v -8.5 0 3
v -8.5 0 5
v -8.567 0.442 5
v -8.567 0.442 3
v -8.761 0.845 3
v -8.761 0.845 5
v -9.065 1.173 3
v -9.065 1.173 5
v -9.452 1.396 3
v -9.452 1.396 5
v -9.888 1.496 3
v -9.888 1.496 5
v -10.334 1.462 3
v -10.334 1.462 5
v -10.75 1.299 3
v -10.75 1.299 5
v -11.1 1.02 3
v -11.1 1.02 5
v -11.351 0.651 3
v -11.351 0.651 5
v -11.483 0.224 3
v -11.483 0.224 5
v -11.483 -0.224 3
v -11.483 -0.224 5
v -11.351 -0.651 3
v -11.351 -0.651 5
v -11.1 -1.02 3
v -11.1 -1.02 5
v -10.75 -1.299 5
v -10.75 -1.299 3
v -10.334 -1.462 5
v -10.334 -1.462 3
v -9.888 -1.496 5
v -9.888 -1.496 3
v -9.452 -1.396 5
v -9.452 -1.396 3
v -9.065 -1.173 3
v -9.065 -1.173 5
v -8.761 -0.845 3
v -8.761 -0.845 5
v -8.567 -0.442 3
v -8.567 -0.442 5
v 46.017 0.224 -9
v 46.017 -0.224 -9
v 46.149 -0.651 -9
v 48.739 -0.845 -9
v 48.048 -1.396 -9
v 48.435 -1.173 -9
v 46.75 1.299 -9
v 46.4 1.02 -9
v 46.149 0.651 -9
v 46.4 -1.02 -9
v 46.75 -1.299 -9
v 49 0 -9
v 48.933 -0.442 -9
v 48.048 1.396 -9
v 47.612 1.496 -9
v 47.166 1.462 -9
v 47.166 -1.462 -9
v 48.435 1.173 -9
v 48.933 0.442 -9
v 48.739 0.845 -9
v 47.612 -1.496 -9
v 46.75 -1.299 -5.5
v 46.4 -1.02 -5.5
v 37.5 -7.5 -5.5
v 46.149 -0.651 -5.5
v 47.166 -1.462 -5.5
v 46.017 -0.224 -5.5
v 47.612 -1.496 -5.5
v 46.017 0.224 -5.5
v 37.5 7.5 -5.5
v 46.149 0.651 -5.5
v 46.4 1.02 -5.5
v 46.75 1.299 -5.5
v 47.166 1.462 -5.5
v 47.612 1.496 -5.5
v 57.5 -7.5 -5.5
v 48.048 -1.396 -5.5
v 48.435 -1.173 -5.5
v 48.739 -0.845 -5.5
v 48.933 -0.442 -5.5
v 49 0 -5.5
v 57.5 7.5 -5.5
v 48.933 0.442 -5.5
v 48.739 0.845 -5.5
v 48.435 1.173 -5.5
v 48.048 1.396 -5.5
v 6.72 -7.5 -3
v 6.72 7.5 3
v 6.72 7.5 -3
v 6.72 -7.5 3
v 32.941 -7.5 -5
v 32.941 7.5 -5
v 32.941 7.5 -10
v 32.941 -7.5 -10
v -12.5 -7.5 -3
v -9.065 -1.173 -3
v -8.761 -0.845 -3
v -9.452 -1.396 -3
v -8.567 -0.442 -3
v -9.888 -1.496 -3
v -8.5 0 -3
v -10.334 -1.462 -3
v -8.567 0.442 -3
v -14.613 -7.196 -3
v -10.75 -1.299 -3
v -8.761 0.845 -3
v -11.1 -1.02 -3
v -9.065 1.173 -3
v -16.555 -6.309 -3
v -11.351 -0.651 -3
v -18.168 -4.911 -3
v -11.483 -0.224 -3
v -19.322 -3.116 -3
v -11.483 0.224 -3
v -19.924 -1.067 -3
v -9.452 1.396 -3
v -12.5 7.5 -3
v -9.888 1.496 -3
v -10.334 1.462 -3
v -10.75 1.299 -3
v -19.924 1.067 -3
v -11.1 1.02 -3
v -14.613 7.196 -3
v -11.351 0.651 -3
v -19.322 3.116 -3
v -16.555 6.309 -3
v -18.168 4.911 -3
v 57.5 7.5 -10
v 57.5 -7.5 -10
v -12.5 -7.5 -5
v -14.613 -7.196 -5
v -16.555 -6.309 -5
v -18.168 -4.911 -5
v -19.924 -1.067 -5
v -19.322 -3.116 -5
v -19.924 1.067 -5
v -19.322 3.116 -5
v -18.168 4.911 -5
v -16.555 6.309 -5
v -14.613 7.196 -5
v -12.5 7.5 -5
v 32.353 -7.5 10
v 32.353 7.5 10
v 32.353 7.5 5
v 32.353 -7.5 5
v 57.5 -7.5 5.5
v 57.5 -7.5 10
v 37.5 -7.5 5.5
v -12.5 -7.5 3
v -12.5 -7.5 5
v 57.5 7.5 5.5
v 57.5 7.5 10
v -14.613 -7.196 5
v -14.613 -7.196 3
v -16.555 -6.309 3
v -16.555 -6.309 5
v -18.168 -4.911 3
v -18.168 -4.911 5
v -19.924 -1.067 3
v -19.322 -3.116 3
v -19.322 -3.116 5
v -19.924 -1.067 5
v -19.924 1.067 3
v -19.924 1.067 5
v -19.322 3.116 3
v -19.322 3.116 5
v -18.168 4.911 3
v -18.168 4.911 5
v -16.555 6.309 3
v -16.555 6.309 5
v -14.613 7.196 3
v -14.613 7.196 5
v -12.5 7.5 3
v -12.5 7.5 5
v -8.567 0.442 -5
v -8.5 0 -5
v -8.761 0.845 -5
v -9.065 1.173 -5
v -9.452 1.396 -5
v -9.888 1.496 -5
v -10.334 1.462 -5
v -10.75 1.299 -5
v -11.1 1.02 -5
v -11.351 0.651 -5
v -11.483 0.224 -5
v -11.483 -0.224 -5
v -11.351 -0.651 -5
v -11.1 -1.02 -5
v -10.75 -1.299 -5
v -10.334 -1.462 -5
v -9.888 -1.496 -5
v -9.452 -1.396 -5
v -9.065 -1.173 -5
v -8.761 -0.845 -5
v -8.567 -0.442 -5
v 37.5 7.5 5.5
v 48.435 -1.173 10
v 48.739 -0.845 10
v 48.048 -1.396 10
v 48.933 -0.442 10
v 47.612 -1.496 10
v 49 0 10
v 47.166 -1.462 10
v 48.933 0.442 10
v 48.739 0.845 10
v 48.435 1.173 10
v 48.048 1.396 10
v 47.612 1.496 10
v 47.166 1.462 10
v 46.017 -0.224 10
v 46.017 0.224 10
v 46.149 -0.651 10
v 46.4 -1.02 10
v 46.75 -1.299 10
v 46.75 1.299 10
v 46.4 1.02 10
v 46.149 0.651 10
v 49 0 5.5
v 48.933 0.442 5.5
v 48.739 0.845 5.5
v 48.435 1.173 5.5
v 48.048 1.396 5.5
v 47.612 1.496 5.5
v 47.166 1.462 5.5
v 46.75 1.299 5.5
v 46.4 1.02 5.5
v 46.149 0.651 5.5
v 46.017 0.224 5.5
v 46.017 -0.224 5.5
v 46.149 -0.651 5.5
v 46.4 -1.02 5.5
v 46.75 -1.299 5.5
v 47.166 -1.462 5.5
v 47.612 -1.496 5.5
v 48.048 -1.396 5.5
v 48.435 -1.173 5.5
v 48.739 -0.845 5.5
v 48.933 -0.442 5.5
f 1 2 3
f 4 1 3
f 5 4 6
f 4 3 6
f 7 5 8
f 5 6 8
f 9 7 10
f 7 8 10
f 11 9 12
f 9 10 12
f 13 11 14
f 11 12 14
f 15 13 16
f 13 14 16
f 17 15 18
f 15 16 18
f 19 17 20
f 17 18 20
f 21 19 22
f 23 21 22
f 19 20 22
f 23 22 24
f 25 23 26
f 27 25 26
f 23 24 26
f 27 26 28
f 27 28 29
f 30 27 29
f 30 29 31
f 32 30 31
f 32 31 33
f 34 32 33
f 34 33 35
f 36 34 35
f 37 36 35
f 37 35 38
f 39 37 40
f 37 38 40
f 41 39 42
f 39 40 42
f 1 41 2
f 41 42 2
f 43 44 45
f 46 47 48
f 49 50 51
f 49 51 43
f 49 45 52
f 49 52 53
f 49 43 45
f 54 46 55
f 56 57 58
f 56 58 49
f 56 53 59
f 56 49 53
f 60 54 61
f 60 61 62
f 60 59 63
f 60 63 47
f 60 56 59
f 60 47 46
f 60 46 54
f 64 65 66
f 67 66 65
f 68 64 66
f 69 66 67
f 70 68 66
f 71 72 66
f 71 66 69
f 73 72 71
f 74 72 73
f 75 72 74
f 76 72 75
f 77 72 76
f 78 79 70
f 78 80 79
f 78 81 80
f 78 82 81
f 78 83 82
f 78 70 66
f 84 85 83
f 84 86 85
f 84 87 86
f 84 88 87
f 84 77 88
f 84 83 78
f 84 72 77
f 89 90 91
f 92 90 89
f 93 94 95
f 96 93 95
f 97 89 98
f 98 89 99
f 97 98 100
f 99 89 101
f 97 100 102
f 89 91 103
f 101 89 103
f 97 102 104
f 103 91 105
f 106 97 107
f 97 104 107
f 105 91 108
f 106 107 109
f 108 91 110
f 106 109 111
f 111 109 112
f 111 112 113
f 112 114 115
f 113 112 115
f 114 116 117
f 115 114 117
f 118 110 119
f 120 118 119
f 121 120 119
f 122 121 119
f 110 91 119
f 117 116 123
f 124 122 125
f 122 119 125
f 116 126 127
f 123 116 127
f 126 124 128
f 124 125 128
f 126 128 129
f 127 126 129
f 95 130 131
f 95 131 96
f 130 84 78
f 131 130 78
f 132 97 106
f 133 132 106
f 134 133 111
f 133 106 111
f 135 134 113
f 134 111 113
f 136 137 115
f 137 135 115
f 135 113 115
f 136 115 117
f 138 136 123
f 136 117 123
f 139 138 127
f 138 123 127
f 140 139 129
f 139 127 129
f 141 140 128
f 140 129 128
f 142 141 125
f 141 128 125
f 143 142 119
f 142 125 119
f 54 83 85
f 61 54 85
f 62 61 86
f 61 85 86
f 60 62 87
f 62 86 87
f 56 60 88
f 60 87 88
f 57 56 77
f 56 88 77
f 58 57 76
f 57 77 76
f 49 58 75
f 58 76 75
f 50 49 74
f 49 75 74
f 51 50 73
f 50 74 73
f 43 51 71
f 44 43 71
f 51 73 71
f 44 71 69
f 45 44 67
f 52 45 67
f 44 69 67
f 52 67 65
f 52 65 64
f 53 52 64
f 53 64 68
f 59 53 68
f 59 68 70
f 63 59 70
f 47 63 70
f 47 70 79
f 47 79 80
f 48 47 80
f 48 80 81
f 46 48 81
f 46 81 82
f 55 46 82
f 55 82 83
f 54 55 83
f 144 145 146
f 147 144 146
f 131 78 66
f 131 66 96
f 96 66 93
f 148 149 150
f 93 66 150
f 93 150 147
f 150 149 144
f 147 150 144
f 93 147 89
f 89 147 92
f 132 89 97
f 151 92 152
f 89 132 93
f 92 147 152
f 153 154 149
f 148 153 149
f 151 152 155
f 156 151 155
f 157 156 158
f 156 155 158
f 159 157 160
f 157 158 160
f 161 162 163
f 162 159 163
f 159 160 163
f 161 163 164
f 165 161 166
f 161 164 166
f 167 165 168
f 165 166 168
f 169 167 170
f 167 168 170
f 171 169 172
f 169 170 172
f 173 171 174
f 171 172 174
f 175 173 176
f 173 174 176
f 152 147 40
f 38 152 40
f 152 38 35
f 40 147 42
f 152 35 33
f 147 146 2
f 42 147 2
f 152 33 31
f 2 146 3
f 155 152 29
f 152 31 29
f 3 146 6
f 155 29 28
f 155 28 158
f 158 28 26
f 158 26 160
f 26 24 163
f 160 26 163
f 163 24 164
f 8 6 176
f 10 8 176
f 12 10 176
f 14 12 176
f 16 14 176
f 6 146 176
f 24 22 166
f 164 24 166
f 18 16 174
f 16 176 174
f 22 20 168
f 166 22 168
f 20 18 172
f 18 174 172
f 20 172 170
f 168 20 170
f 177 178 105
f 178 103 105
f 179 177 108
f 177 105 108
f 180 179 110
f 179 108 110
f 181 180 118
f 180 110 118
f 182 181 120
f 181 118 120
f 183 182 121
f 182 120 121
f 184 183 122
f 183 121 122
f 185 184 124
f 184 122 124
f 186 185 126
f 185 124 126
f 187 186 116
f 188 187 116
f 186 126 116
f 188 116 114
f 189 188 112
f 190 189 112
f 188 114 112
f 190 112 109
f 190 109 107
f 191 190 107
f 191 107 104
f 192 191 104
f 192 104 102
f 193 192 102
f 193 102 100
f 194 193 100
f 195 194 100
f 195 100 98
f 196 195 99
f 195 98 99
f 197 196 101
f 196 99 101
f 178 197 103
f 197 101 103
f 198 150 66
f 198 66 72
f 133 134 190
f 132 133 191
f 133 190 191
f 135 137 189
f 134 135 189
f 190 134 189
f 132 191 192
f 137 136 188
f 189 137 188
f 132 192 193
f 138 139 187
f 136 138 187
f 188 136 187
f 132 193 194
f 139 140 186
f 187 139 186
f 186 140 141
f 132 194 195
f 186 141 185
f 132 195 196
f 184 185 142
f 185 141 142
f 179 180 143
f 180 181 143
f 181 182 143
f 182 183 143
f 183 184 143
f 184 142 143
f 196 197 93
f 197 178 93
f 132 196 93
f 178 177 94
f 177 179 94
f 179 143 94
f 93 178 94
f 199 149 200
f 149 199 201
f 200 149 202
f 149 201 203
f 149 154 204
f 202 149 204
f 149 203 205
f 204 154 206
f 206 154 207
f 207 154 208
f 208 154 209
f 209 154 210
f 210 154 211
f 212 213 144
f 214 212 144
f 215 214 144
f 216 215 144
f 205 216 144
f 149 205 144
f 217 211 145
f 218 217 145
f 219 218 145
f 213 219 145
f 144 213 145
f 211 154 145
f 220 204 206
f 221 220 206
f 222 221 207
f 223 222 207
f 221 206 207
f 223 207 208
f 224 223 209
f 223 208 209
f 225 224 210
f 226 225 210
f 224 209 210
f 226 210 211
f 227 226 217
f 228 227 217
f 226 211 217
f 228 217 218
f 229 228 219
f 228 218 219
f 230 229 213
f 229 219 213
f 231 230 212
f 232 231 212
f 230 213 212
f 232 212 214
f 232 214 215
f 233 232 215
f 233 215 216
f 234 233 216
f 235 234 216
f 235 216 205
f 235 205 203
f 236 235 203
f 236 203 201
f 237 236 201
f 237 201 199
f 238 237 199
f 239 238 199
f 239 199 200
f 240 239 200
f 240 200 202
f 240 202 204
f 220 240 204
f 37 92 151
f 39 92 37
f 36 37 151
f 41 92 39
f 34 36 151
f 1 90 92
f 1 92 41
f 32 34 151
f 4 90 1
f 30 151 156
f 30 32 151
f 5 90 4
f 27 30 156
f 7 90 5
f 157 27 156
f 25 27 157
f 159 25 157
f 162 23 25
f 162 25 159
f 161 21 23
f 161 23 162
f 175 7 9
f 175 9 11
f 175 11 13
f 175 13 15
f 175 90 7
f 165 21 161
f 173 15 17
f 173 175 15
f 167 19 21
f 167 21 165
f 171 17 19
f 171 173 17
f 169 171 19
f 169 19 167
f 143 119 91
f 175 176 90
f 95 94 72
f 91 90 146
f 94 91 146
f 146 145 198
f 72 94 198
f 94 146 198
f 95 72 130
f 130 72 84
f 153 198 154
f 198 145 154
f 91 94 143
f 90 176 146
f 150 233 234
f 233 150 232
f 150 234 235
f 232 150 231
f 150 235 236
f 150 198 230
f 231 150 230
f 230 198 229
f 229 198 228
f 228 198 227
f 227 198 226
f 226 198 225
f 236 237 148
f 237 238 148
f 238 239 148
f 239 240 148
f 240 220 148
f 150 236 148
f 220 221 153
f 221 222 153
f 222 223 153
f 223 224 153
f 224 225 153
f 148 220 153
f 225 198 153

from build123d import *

# Parameters (mm, degrees)
Y_KSEKLIK_EKSTR_ZYON1_DEPTH = 10
KES_EKSTR_ZYON1_DEPTH       = 3
IZIM4_R                     = 1.5
KES_EKSTR_ZYON2_DEPTH       = 7.5
IZIM5_W                     = 20
IZIM5_H                     = 16.82010055
KES_EKSTR_ZYON4_DEPTH       = 5.5
IZIM6_R                     = 1.5
KES_EKSTR_ZYON5_DEPTH       = 19
KES_EKSTR_ZYON6_DEPTH       = 12


with BuildPart() as part:
    # Çizim1 → Yükseklik-Ekstrüzyon1 (new, symmetric)
    with BuildSketch(Plane.XY):
        with BuildLine():
            Line((-12.5, 7.5), (57.5, 7.5))
            Line((57.5, 7.5), (57.5, -7.5))
            Line((57.5, -7.5), (-12.5, -7.5))
            ThreePointArc((-12.5, -7.5), (-20, 0), (-12.5, 7.5))
        make_face()
    extrude(amount=Y_KSEKLIK_EKSTR_ZYON1_DEPTH, both=True)

    # Çizim2 → Kes-Ekstrüzyon1 (cut, symmetric)
    with BuildSketch(Plane.XY):
        with BuildLine():
            Line((6.719945644, -7.5), (-13.280054356, -7.5))
            ThreePointArc((-13.280054356, -7.5), (-20.780054356, 0), (-13.280054356, 7.5))
            Line((-13.280054356, 7.5), (6.719945644, 7.5))
            Line((6.719945644, 7.5), (6.719945644, -7.5))
        make_face()
    extrude(amount=KES_EKSTR_ZYON1_DEPTH, both=True, mode=Mode.SUBTRACT)

    # Çizim4 → Kes-Ekstrüzyon2 (cut, symmetric)
    with BuildSketch(Plane.XY):
        with Locations((-10, 0)):
            Circle(IZIM4_R)
    extrude(amount=KES_EKSTR_ZYON2_DEPTH, both=True, mode=Mode.SUBTRACT)

    # Çizim5 → Kes-Ekstrüzyon4 (cut, symmetric)
    with BuildSketch(Plane.XY):
        with Locations((47.5, -0.910050275)):
            Rectangle(IZIM5_W, IZIM5_H)
    extrude(amount=KES_EKSTR_ZYON4_DEPTH, both=True, mode=Mode.SUBTRACT)

    # Çizim6 → Kes-Ekstrüzyon5 (cut)
    with BuildSketch(Plane.XY.offset(10)):
        with Locations((47.5, 0)):
            Circle(IZIM6_R)
    extrude(amount=-KES_EKSTR_ZYON5_DEPTH, mode=Mode.SUBTRACT)

    # Çizim7 → Kes-Ekstrüzyon6 (cut, symmetric)
    with BuildSketch(Plane(origin=(0, 0, 0), x_dir=(1, 0, 0), z_dir=(0, 1, 0))):
        Polygon((32.353261004, -10), (32.353261004, -5), (-23.403314964, -5), (-23.403314964, 5), (32.941056233, 5), (32.941056233, 10), (-29.197296503, 10), (-29.197296503, -10), align=None)
    extrude(amount=KES_EKSTR_ZYON6_DEPTH, both=True, mode=Mode.SUBTRACT)


solid = part.part
